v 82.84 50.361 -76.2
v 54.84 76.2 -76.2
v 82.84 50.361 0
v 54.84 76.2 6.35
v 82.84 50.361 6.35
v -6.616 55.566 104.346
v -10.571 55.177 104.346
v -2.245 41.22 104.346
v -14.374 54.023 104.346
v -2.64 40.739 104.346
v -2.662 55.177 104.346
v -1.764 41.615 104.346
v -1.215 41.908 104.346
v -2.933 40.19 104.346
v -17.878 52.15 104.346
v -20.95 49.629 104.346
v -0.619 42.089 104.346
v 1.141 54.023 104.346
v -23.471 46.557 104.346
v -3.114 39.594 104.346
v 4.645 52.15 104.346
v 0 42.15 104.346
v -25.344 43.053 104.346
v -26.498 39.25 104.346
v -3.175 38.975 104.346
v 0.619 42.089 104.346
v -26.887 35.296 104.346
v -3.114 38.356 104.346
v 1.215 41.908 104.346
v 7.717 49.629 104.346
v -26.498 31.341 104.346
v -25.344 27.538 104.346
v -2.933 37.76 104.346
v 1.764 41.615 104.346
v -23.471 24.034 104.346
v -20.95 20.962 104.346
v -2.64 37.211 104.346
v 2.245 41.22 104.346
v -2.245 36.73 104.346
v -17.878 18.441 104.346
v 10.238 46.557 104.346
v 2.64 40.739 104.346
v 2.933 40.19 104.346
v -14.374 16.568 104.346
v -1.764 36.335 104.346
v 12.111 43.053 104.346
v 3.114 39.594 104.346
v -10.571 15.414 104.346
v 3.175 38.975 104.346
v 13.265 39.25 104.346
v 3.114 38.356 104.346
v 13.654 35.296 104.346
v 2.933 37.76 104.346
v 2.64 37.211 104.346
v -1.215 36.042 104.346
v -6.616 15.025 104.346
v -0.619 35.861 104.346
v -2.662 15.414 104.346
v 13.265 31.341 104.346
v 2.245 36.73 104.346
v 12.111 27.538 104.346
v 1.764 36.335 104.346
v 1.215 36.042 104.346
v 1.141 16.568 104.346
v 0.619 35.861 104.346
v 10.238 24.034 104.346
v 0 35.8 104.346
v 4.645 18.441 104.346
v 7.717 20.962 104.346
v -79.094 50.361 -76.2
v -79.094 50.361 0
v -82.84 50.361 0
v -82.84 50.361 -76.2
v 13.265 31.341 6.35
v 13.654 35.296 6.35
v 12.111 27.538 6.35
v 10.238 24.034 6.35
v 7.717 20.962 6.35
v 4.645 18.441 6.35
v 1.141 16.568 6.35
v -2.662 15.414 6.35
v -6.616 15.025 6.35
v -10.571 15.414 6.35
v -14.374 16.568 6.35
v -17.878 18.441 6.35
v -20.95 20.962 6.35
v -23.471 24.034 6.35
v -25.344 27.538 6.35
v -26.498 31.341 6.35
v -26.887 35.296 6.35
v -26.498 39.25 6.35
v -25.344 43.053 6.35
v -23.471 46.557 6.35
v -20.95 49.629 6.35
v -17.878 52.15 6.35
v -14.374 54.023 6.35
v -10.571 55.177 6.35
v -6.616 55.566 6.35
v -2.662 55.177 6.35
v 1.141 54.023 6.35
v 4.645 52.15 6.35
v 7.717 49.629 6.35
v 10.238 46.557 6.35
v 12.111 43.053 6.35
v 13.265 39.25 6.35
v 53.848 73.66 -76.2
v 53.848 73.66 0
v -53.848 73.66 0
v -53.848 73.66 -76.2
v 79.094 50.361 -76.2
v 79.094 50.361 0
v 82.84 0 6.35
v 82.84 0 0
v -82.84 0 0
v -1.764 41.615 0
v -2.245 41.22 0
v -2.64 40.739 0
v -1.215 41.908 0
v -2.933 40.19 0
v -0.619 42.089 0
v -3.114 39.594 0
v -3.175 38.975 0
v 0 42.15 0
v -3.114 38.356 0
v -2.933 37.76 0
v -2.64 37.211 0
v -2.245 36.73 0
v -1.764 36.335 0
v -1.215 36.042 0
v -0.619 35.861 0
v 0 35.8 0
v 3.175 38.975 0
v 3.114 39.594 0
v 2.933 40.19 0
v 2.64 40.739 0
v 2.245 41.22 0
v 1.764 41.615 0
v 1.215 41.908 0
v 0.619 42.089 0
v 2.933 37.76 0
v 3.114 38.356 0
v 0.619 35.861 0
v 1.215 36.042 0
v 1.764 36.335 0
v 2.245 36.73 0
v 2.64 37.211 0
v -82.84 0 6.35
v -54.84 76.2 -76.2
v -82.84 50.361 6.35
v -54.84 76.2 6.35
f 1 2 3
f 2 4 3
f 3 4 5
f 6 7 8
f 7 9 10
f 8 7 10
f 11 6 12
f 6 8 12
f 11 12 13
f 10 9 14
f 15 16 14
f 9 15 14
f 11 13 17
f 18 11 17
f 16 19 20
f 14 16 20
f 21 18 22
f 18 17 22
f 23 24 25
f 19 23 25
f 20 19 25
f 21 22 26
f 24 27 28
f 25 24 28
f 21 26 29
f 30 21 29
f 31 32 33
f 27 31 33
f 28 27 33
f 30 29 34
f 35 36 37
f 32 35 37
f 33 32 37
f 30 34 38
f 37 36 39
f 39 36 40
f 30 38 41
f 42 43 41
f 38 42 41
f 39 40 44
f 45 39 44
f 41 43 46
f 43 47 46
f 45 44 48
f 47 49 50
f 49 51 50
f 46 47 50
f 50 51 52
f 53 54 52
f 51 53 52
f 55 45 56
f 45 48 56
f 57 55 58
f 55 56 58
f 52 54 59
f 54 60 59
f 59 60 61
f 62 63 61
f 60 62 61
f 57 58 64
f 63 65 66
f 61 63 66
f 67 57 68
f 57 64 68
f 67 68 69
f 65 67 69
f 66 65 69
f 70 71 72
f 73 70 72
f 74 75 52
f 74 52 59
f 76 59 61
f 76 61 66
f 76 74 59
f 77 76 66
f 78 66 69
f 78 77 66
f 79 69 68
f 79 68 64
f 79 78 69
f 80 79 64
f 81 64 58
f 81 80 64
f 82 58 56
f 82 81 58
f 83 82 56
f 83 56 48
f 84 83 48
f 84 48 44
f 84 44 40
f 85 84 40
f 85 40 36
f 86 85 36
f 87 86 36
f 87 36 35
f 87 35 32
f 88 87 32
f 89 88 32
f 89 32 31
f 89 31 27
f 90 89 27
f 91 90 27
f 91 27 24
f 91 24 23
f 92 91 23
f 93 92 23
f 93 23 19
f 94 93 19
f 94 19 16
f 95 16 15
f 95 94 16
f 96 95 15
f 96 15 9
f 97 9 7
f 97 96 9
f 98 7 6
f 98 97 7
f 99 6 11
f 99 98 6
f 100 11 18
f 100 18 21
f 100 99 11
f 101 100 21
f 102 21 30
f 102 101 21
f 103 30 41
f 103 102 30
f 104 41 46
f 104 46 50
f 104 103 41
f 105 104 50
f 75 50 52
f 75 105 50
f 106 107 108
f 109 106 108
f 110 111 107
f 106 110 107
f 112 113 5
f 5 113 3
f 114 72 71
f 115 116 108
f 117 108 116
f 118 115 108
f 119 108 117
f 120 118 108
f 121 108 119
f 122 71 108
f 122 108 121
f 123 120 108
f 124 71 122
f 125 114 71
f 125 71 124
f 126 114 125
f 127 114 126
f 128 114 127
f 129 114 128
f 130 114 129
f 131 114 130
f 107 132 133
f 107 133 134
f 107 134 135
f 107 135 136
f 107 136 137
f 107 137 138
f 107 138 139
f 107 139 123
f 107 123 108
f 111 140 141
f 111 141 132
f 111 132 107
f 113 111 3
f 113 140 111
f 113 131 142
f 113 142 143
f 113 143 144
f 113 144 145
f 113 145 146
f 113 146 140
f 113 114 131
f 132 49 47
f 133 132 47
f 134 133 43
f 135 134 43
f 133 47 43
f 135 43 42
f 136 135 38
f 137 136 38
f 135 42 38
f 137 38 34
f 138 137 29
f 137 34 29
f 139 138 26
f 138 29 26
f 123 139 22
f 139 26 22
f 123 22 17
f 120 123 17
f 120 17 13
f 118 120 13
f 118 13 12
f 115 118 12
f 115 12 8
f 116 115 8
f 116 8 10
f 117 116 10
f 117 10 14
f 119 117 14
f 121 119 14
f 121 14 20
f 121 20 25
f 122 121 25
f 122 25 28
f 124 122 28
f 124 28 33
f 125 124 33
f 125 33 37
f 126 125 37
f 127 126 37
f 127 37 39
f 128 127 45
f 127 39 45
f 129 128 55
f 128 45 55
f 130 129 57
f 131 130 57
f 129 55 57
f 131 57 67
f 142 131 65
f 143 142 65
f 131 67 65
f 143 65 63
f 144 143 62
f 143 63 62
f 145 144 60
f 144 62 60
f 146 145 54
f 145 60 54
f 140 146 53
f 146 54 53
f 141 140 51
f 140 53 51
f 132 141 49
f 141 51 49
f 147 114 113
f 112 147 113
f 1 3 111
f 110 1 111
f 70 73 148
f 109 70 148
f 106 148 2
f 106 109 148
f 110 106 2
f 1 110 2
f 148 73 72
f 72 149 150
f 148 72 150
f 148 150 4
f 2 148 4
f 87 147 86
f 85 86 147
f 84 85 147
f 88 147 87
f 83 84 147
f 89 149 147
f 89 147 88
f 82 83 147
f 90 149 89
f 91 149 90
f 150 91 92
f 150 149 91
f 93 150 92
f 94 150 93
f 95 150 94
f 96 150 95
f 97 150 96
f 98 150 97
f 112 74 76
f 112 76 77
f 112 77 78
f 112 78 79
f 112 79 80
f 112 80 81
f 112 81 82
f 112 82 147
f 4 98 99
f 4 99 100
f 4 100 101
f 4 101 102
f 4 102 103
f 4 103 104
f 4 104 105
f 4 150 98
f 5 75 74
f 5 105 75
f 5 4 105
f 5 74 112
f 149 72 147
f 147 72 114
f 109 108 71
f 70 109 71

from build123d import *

# Parameters (mm, degrees)
F1_DEPTH = 6.35
F3_DEPTH = 76.2
F4_R     = 20.270686
F5_DEPTH = 104.346251
F6_R     = 3.175
F7_DEPTH = 180.547251


with BuildPart() as f1:
    # F0 (on Top) → F1 (new body)
    with BuildSketch(Plane.XY):
        Polygon((-82.839586, 50.360938), (-82.839586, 0), (82.839586, 0), (82.839586, 50.360938), (54.840428, 76.2), (-54.840428, 76.2), align=None)
    extrude(amount=F1_DEPTH)

    # F2 (on face) → F3 (join)
    with BuildSketch(Plane(origin=(0, 0, 0), x_dir=(1, 0, 0), z_dir=(0, 0, -1))):
        Polygon((-54.840428, -76.2), (54.840428, -76.2), (82.839586, -50.360938), (79.094327, -50.360938), (53.847508, -73.66), (-53.847508, -73.66), (-79.094327, -50.360938), (-82.839586, -50.360938), align=None)
    extrude(amount=F3_DEPTH)

    # F4 (on face) → F5 (join)
    with BuildSketch(Plane(origin=(0, 0, 0), x_dir=(1, 0, 0), z_dir=(0, 0, -1))):
        with Locations((-6.616414, -35.295554)):
            Circle(F4_R)
    extrude(amount=-F5_DEPTH)

    # F6 (on face) → F7 (cut, through all)
    with BuildSketch(Plane.XY.offset(104.346251)):
        with Locations((0, 38.975005)):
            Circle(F6_R)
    extrude(amount=-F7_DEPTH, mode=Mode.SUBTRACT)


solid = f1.part
